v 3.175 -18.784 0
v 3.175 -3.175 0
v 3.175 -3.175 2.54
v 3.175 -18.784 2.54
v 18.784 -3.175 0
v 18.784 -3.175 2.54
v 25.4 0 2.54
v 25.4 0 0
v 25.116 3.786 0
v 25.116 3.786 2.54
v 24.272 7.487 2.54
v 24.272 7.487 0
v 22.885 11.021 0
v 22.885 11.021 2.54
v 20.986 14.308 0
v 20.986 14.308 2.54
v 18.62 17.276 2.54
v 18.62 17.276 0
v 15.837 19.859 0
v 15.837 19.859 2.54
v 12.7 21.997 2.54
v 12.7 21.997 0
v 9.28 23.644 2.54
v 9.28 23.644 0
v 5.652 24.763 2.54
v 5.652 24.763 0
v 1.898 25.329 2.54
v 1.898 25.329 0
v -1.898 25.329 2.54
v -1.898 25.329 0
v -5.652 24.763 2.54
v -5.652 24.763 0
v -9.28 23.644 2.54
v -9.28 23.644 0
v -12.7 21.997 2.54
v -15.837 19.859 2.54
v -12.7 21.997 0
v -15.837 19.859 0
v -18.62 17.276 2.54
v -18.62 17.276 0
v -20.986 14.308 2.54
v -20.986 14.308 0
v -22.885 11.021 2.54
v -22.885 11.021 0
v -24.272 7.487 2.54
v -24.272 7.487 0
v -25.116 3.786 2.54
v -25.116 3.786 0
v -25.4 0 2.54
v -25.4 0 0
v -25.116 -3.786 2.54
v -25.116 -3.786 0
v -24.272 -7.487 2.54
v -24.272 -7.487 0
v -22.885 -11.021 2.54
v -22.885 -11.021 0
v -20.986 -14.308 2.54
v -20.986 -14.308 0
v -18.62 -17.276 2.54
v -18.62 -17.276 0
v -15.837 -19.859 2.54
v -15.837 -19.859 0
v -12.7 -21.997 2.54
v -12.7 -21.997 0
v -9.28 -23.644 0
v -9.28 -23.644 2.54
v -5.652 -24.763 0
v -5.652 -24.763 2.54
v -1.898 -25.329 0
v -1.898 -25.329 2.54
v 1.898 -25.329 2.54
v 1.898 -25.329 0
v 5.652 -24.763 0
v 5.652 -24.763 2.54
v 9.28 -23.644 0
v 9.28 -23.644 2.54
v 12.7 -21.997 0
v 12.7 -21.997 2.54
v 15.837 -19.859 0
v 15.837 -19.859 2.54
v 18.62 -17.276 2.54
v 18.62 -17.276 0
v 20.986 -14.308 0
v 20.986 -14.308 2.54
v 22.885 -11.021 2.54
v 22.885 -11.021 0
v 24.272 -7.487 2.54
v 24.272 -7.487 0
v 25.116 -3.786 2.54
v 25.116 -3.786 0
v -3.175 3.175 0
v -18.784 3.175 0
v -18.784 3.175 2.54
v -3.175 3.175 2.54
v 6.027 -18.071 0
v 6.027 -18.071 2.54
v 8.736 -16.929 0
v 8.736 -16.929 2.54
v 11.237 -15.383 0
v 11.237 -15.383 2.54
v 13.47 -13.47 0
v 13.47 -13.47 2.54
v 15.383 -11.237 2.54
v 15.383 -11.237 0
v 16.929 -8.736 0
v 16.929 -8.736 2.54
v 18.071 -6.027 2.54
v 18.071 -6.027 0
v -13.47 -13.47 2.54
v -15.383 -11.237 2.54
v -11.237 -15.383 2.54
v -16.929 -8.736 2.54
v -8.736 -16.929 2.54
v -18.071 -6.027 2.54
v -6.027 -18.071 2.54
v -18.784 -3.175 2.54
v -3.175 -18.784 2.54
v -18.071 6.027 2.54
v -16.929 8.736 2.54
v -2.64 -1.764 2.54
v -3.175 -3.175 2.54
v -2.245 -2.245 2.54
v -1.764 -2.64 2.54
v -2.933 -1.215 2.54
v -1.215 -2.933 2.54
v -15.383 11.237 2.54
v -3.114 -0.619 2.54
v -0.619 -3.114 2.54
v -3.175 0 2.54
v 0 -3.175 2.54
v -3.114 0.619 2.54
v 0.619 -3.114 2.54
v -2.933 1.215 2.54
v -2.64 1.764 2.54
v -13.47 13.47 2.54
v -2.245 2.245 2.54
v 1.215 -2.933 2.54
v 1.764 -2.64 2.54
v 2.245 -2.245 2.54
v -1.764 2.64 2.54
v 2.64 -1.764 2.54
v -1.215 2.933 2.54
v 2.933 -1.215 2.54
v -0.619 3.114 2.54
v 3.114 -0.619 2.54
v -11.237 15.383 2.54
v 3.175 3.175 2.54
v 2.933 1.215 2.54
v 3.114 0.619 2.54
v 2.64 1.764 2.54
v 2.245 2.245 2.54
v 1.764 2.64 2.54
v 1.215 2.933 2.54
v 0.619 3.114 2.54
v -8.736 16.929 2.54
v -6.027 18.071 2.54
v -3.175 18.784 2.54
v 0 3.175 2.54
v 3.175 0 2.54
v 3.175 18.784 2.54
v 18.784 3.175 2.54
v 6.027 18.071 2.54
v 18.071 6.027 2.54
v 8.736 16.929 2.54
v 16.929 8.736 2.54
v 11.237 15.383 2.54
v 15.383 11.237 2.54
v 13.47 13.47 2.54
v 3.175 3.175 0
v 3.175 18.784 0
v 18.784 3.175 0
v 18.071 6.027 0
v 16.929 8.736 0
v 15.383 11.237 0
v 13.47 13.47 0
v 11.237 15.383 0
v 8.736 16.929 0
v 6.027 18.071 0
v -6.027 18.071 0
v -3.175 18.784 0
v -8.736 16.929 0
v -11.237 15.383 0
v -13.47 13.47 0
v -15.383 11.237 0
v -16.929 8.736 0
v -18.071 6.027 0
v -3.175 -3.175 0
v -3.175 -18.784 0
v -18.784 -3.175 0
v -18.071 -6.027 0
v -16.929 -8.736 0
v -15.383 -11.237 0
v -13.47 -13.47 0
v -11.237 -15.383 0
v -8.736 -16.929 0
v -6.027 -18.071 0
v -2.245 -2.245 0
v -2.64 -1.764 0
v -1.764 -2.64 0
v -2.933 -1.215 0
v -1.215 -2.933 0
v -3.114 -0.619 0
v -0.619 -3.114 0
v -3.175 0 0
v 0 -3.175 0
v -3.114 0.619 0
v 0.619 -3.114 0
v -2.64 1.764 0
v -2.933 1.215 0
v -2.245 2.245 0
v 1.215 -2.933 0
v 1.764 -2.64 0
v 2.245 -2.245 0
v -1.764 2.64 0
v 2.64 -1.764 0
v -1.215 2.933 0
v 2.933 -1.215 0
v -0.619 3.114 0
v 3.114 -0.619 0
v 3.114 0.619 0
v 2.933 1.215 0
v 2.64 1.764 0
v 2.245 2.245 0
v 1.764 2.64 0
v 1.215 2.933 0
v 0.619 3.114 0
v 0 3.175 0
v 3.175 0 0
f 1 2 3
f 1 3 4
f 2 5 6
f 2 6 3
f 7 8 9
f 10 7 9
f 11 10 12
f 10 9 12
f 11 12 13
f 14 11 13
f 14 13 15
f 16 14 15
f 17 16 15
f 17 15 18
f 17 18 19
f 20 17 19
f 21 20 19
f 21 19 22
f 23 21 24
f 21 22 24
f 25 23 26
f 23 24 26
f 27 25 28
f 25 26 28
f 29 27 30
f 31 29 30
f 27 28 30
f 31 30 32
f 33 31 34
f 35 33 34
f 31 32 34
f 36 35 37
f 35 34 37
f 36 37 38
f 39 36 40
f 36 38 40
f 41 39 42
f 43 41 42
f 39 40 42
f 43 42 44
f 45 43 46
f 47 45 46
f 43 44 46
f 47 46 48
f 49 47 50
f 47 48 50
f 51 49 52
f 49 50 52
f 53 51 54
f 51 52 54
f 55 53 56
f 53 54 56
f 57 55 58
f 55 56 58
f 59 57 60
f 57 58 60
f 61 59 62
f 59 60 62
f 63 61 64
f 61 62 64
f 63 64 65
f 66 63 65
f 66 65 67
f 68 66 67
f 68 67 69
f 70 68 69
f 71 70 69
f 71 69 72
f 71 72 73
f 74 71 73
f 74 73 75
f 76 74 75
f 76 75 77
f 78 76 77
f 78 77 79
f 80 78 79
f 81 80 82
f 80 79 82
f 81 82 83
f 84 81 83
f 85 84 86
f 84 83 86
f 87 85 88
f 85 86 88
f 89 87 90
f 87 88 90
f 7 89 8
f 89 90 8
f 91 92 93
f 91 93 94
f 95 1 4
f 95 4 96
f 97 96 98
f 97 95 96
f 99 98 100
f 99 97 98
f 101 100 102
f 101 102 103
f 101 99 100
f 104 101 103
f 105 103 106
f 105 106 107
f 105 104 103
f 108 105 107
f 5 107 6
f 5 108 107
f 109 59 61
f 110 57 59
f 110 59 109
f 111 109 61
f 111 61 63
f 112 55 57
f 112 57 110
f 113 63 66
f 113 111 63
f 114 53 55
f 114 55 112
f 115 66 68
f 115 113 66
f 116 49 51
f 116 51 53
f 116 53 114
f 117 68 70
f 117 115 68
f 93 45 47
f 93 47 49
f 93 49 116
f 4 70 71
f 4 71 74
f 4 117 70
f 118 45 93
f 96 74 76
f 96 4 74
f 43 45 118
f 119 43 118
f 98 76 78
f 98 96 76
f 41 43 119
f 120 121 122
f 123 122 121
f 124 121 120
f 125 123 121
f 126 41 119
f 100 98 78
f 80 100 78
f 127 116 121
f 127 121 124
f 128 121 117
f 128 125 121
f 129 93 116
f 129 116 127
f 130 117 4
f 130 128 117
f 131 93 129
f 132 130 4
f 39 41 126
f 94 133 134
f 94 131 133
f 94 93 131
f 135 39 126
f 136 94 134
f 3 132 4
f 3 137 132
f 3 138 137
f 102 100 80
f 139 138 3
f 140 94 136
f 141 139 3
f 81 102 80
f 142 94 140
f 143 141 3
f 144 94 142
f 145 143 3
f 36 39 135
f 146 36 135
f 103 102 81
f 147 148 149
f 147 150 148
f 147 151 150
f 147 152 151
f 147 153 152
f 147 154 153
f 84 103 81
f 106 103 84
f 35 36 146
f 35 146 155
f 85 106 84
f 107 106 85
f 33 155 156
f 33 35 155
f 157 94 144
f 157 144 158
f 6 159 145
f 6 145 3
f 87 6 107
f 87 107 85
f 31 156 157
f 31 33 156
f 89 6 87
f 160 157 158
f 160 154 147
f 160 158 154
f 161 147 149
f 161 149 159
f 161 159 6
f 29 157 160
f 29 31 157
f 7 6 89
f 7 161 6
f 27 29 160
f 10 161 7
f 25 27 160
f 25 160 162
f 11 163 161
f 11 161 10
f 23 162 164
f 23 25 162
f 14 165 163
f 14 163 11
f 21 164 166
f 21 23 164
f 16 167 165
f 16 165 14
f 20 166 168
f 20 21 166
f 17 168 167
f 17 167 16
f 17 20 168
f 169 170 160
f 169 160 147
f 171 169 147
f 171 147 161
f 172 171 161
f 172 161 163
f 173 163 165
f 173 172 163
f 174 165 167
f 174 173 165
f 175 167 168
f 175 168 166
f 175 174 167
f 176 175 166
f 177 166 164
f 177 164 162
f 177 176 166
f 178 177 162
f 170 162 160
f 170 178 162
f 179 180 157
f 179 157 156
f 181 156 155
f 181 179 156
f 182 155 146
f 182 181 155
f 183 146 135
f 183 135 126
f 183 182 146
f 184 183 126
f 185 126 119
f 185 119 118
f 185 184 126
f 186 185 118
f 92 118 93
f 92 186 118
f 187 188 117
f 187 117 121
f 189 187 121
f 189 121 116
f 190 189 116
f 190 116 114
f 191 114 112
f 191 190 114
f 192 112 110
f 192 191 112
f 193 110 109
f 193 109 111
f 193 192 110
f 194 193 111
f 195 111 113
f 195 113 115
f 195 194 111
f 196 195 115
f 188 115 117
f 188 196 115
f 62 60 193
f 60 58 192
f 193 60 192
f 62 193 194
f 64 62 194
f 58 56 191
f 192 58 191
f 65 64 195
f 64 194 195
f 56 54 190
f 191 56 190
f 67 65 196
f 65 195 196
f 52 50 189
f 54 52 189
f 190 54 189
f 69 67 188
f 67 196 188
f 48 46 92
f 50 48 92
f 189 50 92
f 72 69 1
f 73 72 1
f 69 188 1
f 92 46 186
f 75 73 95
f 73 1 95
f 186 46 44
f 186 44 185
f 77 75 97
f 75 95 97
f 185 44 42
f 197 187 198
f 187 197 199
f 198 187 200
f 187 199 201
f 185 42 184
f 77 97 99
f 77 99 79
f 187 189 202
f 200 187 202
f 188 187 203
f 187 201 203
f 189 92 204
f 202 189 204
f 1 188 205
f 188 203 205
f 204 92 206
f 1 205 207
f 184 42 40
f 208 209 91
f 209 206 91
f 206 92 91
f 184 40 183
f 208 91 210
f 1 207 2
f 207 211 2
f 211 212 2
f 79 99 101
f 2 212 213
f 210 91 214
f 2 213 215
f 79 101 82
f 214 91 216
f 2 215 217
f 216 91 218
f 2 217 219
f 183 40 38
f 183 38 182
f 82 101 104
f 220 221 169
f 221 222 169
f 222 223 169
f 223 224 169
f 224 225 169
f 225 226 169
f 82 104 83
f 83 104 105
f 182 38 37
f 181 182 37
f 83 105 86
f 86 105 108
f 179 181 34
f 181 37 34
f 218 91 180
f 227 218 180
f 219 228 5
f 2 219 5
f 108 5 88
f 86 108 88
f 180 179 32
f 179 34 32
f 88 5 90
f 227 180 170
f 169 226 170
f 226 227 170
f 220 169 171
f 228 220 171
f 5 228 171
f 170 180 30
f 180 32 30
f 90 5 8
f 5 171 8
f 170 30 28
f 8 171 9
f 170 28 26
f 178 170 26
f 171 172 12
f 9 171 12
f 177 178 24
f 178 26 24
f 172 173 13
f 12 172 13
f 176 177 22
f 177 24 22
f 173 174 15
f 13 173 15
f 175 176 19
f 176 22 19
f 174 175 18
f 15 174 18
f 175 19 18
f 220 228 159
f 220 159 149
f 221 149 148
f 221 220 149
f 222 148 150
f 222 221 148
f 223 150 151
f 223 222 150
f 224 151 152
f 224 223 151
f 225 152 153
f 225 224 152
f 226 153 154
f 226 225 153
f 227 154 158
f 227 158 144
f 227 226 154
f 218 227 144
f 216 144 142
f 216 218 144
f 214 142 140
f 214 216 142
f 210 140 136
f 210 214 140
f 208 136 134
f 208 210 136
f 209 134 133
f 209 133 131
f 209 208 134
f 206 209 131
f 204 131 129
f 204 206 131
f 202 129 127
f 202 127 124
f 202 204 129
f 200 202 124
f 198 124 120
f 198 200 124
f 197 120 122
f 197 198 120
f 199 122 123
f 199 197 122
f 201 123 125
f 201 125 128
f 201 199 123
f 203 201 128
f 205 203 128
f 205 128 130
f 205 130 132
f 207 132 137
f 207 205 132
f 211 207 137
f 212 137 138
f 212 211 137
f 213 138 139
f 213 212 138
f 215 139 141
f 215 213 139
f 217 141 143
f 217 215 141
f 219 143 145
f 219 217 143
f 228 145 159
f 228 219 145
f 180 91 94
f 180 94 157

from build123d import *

# Parameters (mm, degrees)
SKETCH1_R           = 25.4
BOSS_EXTRUDE1_DEPTH = 2.54
SKETCH1_4_R         = 3.175
CUT_EXTRUDE2_DEPTH  = 2.54


with BuildPart() as part:
    # Sketch1 → Boss-Extrude1 (new body)
    with BuildSketch(Plane.XY):
        Circle(SKETCH1_R)
    extrude(amount=BOSS_EXTRUDE1_DEPTH)

    # Sketch1<4> → Cut-Extrude2 (cut)
    with BuildSketch(Plane.XY):
        with BuildLine():
            Line((-3.175, -18.783553311), (-3.175, -3.175))
            Line((-3.175, -3.175), (-18.783553311, -3.175))
            ThreePointArc((-18.783553311, -3.175), (-13.470384182, -13.470384182), (-3.175, -18.783553311))
        make_face()
        with BuildLine():
            Line((-18.783553311, 3.175), (-3.175, 3.175))
            Line((-3.175, 3.175), (-3.175, 18.783553311))
            ThreePointArc((-3.175, 18.783553311), (-13.470384182, 13.470384182), (-18.783553311, 3.175))
        make_face()
        with BuildLine():
            Line((3.175, 18.783553311), (3.175, 3.175))
            Line((3.175, 3.175), (18.783553311, 3.175))
            ThreePointArc((18.783553311, 3.175), (13.470384182, 13.470384182), (3.175, 18.783553311))
        make_face()
        with BuildLine():
            Line((18.783553311, -3.175), (3.175, -3.175))
            Line((3.175, -3.175), (3.175, -18.783553311))
            ThreePointArc((3.175, -18.783553311), (13.470384182, -13.470384182), (18.783553311, -3.175))
        make_face()
        Circle(SKETCH1_4_R)
    extrude(amount=CUT_EXTRUDE2_DEPTH, mode=Mode.SUBTRACT)


solid = part.part
